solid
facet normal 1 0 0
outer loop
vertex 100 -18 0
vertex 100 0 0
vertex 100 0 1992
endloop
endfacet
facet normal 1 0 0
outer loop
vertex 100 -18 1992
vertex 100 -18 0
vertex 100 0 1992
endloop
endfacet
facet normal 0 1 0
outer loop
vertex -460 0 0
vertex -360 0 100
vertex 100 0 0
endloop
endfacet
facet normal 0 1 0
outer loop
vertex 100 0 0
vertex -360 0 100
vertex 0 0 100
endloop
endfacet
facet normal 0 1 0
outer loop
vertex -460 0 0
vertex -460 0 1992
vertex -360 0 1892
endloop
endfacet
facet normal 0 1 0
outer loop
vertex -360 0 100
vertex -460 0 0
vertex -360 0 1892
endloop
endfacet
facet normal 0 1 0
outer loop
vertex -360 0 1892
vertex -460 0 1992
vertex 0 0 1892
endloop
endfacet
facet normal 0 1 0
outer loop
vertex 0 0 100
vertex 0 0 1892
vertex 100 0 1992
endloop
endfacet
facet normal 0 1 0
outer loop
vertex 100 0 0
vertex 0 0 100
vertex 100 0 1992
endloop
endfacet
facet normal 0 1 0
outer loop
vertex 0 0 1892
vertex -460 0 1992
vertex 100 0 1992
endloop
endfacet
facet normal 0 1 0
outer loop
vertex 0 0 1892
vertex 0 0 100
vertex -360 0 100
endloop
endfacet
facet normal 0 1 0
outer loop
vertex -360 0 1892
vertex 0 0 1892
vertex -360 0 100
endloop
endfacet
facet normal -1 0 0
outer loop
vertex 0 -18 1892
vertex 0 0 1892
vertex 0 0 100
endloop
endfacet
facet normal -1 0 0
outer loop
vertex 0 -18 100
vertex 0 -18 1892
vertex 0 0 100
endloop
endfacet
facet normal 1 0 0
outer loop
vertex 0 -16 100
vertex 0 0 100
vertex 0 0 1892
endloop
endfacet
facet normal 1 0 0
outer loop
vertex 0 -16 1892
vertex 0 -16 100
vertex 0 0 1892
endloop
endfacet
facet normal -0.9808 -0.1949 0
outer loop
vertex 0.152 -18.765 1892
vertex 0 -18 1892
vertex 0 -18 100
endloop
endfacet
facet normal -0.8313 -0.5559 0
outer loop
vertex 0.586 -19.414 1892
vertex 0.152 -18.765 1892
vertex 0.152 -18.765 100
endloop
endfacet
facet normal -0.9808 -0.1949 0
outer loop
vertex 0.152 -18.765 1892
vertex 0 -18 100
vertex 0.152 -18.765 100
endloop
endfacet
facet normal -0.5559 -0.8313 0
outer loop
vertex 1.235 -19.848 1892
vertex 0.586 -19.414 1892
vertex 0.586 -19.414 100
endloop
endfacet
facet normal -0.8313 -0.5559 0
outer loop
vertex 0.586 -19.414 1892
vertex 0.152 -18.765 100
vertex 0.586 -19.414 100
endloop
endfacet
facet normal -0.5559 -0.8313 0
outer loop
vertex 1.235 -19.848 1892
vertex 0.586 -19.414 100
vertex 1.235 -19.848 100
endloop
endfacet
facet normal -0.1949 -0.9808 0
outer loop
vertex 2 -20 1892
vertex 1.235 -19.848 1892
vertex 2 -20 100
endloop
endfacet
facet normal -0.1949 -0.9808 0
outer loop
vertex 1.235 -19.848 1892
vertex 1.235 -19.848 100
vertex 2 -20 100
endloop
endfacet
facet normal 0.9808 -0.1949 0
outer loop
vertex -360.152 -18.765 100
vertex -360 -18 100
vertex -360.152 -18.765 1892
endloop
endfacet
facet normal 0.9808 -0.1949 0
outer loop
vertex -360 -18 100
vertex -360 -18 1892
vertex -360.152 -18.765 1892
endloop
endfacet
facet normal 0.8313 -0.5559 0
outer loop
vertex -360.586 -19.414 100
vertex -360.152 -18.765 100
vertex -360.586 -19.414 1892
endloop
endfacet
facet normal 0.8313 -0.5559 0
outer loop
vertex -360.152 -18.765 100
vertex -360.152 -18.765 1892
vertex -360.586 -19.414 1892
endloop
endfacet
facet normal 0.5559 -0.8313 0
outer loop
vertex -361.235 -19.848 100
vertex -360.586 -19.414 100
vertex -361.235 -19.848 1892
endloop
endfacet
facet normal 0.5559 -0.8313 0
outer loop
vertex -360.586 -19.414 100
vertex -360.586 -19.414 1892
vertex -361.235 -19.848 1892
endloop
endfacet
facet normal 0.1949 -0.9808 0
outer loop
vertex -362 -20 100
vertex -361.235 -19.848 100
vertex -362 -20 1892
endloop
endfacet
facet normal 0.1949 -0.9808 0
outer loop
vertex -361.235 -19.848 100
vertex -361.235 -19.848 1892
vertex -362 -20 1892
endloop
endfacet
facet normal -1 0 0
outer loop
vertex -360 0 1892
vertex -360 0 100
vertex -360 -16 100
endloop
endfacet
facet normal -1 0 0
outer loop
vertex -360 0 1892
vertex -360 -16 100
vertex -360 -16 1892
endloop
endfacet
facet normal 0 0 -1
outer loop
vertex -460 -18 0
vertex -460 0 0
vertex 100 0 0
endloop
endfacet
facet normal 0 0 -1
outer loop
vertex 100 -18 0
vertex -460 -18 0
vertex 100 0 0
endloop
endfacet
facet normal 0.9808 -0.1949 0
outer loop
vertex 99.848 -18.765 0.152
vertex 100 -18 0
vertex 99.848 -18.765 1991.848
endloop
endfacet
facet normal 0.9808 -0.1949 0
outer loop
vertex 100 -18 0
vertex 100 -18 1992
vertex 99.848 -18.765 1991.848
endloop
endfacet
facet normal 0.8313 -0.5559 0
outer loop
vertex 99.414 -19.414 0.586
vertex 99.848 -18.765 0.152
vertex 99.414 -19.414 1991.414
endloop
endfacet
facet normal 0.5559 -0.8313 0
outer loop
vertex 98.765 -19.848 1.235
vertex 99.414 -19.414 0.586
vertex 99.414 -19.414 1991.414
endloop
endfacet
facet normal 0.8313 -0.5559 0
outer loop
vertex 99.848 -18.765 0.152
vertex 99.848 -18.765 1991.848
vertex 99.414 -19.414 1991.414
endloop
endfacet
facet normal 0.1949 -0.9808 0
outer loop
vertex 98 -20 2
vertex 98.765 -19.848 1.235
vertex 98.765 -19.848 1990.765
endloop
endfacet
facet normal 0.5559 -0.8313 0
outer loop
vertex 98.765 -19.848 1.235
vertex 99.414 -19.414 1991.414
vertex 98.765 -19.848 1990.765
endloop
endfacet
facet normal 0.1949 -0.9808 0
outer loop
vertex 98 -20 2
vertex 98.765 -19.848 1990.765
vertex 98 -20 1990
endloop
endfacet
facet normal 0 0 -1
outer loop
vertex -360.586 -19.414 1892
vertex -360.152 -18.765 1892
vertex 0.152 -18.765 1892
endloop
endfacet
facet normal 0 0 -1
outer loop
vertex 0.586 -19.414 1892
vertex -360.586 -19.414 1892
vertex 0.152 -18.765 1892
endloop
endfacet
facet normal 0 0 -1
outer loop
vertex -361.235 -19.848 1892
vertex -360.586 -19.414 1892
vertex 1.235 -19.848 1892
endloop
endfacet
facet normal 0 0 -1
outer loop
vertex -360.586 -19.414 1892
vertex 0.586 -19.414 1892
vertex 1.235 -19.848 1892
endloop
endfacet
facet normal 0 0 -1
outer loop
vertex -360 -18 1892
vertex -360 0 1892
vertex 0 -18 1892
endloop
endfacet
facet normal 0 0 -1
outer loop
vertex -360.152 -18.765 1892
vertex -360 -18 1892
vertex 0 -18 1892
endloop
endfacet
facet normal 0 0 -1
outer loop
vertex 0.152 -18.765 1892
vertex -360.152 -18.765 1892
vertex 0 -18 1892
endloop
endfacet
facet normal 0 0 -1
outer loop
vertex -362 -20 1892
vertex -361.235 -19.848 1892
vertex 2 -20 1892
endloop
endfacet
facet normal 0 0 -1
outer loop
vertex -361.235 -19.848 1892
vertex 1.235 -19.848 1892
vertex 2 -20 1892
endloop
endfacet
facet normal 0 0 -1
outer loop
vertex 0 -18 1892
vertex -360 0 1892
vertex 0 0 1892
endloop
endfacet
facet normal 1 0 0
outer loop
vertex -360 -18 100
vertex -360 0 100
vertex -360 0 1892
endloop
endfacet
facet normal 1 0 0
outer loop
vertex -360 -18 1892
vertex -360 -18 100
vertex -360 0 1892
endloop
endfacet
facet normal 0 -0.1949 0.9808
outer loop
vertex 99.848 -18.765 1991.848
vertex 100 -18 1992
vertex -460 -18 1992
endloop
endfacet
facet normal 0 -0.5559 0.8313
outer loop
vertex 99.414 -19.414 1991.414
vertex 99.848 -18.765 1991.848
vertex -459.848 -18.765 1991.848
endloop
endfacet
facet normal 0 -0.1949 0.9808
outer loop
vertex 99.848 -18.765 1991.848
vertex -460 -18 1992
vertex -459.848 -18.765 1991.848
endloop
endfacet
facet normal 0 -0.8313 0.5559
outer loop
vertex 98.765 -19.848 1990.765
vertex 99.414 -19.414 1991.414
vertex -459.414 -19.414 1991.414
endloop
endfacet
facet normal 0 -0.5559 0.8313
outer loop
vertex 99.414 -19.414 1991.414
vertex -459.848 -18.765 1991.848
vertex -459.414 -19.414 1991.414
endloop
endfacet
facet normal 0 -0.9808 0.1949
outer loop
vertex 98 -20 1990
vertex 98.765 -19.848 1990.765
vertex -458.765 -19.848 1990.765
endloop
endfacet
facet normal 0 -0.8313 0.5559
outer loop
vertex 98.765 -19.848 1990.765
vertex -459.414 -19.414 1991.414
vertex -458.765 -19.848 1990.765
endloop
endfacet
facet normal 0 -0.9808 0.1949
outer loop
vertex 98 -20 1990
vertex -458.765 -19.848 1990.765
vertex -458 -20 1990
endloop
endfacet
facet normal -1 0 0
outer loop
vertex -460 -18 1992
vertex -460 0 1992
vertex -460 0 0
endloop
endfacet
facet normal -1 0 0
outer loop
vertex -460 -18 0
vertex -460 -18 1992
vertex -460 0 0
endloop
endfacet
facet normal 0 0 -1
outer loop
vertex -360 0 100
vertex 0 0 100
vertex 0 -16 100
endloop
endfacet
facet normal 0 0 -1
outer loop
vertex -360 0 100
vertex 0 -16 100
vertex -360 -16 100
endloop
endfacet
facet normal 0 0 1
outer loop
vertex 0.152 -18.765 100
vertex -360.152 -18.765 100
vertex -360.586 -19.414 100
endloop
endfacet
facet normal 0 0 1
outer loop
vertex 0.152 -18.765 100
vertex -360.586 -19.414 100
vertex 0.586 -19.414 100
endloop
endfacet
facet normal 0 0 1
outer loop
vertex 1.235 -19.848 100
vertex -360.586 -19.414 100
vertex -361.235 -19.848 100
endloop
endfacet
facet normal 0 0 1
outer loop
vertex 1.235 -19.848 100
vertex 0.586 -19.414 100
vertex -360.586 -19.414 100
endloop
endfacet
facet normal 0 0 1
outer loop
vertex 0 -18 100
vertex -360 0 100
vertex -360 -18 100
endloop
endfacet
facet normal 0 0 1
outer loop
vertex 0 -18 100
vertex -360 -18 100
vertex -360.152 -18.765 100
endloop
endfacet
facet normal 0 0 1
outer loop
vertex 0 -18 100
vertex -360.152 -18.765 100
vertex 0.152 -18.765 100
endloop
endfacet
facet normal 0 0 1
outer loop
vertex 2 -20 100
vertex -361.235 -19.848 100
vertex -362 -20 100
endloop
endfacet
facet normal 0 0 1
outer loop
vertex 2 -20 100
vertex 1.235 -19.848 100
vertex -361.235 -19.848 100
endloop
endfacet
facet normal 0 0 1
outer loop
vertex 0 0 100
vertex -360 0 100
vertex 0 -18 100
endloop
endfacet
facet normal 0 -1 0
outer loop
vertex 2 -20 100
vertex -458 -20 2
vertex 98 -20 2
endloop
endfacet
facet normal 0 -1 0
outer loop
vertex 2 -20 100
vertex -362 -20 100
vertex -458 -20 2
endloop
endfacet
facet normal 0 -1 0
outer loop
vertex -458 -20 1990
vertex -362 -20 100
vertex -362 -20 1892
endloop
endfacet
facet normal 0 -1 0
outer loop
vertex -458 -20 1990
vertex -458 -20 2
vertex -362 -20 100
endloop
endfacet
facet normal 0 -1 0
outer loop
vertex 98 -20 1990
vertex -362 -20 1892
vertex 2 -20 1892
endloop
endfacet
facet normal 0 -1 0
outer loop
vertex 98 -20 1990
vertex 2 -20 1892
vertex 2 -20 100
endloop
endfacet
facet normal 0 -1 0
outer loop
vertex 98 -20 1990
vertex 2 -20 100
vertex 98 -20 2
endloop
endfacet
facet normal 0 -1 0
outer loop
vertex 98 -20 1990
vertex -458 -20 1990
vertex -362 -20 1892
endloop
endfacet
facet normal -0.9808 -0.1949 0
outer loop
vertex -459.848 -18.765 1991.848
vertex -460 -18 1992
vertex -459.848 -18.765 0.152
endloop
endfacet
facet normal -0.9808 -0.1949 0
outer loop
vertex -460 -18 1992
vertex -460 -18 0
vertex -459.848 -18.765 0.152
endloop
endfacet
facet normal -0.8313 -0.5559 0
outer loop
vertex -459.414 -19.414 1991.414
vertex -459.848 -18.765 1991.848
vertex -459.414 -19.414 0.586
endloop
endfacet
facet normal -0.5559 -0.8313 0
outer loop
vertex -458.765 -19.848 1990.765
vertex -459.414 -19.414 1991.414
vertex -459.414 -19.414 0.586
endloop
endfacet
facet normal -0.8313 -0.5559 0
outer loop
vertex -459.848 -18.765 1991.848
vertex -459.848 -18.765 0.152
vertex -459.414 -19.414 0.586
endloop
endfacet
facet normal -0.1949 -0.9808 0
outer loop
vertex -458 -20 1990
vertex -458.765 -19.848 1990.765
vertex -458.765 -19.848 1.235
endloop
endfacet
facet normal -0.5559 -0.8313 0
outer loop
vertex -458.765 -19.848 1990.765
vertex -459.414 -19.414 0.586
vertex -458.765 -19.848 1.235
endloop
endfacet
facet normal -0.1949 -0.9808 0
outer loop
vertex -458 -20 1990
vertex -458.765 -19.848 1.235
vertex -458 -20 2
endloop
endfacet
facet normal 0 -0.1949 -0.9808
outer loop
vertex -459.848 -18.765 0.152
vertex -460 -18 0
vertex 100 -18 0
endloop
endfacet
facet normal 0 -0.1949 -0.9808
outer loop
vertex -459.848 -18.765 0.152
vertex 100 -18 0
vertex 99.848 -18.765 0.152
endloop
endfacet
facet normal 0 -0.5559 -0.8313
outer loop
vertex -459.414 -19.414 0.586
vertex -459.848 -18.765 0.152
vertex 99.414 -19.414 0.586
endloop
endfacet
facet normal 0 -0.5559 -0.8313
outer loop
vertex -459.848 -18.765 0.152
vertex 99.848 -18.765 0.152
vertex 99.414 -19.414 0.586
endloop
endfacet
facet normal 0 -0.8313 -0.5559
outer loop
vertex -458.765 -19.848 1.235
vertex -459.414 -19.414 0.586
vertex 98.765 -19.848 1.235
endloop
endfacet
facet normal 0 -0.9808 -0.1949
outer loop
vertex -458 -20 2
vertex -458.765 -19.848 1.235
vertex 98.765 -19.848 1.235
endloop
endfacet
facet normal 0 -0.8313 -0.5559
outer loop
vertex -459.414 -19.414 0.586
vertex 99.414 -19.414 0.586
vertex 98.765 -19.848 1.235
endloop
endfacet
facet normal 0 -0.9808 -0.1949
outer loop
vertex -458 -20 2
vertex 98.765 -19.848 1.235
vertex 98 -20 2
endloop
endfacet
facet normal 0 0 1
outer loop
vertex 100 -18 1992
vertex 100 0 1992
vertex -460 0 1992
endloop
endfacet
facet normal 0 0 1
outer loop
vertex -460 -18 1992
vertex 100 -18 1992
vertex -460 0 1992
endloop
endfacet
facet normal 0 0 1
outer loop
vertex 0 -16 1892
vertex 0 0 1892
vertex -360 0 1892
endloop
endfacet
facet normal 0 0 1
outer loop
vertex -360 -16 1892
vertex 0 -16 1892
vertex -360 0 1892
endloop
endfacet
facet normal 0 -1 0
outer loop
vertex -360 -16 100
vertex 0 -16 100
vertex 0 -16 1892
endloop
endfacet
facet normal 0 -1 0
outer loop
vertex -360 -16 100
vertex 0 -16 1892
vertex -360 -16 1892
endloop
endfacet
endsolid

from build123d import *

# Parameters (mm, degrees)
F0_W     = 360
F0_H     = 100
F1_DEPTH = 20
F2_R     = 2
F3_W     = 360
F3_H     = 1792
F4_DEPTH = 16


with BuildPart() as f1:
    # F0 (on Front) → F1 (new body)
    with BuildSketch(Plane.XZ):
        Polygon((-460, 0), (-360, 0), (-360, 100), (-360, 1892), (-360, 1992), (-460, 1992), align=None)
        with Locations((-180, 50)):
            Rectangle(F0_W, F0_H)
        with Locations((-180, 1942)):
            Rectangle(F0_W, F0_H)
        Polygon((0, 100), (0, 0), (100, 0), (100, 1992), (0, 1992), (0, 1892), align=None)
    extrude(amount=F1_DEPTH)

    # F2
    f2_edges = [f1.edges().sort_by_distance(p)[0] for p in [
        (-460, -20, 996),
        (-180, -20, 0),
        (100, -20, 996),
        (-180, -20, 1992),
        (-360, -20, 996),
        (0, -20, 996),
    ]]
    fillet(f2_edges, radius=F2_R)


with BuildPart() as f4:
    # F3 (on face) → F4 (new body)
    with BuildSketch(Plane(origin=(0, 0, 0), x_dir=(-1, 0, 0), z_dir=(0, 1, 0))):
        with Locations((180, 996)):
            Rectangle(F3_W, F3_H)
    extrude(amount=-F4_DEPTH)


solid = Compound([f1.part, f4.part])
